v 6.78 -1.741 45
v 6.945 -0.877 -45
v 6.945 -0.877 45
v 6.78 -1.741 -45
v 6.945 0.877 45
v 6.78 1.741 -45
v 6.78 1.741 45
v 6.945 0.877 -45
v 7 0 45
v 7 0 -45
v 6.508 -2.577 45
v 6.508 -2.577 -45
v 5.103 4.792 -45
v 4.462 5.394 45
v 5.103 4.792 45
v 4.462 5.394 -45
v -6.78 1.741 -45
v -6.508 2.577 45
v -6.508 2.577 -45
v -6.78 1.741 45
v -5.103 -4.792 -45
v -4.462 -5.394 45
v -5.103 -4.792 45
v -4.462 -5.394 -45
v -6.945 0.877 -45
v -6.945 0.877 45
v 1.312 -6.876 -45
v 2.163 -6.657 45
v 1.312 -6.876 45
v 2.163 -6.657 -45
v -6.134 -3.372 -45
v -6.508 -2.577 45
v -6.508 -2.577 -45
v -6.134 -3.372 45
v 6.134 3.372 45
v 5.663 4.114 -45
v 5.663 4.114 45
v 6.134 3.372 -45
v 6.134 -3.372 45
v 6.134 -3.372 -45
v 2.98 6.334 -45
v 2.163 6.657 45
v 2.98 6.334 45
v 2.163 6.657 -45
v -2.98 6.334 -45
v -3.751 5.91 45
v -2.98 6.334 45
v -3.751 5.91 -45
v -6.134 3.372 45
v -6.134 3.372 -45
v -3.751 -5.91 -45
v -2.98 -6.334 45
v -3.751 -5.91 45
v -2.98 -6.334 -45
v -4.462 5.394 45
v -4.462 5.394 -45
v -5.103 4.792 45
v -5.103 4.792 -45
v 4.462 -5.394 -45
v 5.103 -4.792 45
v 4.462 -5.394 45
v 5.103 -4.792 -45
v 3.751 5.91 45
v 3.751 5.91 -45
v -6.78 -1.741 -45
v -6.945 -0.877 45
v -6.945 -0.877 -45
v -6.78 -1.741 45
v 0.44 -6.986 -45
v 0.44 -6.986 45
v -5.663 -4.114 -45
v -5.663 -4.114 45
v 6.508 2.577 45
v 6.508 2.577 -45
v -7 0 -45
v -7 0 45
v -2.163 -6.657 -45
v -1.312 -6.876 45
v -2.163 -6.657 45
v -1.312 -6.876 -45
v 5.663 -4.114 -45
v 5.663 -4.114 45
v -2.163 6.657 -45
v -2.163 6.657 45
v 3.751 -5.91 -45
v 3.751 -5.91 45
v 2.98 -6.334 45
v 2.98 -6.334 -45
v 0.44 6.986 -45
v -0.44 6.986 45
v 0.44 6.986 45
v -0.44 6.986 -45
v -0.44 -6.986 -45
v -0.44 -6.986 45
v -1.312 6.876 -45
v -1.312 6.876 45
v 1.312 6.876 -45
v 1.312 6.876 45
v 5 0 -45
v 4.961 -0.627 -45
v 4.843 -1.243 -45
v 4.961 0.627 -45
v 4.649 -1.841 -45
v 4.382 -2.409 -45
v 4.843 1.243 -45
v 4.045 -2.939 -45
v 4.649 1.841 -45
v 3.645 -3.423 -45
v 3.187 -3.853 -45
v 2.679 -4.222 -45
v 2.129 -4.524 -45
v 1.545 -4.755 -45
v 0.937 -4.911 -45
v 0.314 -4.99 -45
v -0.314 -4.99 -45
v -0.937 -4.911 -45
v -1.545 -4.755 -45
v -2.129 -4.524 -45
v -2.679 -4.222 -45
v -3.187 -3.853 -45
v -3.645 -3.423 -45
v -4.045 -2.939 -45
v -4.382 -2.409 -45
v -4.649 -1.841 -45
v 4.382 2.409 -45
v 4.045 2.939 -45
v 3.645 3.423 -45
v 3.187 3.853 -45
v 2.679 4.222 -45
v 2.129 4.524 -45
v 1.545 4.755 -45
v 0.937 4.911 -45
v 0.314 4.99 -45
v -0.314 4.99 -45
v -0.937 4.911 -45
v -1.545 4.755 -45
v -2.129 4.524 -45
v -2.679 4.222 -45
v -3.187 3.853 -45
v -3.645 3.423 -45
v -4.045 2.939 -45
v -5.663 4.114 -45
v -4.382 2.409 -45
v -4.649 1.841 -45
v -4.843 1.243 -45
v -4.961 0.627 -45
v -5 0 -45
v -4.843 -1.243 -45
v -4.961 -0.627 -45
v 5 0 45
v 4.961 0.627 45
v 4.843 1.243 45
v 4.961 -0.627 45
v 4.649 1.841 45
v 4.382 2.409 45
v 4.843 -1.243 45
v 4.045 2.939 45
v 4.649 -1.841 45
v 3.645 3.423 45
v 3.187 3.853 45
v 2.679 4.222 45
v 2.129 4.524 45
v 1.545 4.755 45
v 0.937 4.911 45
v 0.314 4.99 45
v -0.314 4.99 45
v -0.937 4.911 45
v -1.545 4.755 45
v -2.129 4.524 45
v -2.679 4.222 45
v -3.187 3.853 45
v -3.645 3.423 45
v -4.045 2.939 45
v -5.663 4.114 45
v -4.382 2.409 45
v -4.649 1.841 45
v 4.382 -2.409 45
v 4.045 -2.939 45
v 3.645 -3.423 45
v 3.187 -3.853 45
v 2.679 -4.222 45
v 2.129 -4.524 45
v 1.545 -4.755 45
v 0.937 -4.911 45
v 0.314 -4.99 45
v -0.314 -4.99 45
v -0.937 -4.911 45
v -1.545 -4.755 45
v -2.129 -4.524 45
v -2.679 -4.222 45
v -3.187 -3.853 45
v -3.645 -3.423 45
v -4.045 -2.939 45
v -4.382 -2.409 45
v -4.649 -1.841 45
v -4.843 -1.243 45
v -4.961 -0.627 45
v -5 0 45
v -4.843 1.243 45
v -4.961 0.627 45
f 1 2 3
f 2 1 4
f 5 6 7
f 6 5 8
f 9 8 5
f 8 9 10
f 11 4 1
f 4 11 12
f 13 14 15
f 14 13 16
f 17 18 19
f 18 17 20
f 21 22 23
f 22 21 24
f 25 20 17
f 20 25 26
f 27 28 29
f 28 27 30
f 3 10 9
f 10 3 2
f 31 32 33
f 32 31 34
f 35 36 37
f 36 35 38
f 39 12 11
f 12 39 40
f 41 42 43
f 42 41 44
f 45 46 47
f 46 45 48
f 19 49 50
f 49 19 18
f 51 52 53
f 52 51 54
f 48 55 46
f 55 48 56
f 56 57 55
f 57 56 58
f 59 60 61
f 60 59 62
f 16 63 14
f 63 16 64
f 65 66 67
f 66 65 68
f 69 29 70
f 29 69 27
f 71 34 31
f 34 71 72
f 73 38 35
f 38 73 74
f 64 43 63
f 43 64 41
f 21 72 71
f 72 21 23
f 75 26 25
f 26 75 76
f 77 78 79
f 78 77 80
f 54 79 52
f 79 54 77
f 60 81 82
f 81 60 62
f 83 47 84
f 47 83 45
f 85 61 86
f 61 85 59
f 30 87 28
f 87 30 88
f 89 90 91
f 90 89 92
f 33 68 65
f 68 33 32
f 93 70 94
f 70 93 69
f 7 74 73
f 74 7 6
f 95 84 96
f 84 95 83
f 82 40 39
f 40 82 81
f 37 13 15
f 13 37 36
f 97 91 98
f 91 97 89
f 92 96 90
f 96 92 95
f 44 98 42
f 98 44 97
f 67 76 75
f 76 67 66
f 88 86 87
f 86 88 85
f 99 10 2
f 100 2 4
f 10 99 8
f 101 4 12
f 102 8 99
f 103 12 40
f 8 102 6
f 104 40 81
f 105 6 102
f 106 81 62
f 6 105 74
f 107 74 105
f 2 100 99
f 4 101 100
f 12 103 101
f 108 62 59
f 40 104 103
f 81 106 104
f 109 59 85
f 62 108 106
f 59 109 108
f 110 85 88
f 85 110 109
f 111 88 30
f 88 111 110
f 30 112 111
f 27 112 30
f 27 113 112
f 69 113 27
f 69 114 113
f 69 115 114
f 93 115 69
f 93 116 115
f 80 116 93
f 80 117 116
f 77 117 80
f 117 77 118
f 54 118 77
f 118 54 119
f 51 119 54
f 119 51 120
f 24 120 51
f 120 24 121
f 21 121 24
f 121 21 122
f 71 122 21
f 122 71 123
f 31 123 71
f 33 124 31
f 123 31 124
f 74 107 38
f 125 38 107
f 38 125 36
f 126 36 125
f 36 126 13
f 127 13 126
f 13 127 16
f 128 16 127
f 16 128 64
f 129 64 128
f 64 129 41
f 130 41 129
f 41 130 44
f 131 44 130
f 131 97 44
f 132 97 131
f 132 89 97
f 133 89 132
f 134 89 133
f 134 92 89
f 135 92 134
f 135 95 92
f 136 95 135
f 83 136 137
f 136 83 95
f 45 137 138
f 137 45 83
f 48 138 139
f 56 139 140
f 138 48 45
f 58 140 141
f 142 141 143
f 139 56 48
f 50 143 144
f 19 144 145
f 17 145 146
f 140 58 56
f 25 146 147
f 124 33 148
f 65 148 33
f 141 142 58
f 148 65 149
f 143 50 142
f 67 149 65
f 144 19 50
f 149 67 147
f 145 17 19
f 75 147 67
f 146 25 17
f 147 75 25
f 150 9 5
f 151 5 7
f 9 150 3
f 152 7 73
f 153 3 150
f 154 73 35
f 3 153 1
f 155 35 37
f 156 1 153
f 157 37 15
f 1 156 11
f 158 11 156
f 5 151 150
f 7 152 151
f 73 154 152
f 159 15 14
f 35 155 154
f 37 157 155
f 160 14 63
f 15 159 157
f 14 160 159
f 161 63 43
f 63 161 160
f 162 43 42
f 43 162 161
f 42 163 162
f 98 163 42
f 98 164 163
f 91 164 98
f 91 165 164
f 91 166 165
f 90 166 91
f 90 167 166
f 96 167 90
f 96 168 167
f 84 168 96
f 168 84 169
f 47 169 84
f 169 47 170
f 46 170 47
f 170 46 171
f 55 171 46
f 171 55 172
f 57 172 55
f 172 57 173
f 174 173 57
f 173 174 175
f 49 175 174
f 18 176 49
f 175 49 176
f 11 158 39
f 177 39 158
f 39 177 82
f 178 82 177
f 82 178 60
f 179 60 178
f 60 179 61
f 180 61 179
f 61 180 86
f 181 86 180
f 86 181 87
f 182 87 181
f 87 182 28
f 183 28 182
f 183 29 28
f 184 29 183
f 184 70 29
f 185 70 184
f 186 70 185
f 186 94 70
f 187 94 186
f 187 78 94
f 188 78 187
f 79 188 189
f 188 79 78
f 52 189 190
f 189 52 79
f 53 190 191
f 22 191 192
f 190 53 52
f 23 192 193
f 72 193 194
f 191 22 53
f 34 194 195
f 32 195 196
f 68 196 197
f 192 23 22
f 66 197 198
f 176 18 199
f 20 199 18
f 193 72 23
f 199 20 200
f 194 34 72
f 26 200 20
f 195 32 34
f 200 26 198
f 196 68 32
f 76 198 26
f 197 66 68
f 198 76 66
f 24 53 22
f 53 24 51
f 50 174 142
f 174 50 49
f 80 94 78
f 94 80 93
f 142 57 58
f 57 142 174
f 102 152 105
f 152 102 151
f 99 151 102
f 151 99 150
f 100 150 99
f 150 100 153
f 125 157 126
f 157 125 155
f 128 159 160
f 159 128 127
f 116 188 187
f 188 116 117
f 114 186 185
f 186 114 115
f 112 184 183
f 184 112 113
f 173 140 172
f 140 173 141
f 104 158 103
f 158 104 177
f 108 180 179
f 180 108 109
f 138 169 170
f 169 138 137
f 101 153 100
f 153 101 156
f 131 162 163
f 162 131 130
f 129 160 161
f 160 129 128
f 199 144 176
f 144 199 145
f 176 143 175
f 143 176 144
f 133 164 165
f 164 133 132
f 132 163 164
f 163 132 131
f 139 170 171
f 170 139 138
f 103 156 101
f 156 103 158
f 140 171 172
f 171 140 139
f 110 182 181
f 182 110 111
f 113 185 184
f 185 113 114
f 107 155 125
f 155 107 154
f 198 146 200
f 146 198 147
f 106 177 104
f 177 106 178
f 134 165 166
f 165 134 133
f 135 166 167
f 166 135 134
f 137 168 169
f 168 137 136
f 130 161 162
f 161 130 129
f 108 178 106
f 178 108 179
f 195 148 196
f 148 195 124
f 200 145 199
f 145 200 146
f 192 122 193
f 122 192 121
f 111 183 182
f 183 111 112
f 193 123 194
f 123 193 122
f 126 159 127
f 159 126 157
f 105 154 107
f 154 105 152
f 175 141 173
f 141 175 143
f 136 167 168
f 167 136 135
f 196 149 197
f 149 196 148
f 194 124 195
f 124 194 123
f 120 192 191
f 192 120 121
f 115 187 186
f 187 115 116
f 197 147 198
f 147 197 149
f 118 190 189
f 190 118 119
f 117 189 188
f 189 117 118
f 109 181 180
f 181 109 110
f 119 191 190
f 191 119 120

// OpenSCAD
$fn = 50;


difference() {
	union() {
		translate(v = [0, 0, -45.0000000000]) {
			cylinder(h = 90, r = 7.0000000000);
		}
	}
	union() {
		translate(v = [0, 0, -100.0000000000]) {
			cylinder(h = 200, r = 5.0000000000);
		}
	}
}
